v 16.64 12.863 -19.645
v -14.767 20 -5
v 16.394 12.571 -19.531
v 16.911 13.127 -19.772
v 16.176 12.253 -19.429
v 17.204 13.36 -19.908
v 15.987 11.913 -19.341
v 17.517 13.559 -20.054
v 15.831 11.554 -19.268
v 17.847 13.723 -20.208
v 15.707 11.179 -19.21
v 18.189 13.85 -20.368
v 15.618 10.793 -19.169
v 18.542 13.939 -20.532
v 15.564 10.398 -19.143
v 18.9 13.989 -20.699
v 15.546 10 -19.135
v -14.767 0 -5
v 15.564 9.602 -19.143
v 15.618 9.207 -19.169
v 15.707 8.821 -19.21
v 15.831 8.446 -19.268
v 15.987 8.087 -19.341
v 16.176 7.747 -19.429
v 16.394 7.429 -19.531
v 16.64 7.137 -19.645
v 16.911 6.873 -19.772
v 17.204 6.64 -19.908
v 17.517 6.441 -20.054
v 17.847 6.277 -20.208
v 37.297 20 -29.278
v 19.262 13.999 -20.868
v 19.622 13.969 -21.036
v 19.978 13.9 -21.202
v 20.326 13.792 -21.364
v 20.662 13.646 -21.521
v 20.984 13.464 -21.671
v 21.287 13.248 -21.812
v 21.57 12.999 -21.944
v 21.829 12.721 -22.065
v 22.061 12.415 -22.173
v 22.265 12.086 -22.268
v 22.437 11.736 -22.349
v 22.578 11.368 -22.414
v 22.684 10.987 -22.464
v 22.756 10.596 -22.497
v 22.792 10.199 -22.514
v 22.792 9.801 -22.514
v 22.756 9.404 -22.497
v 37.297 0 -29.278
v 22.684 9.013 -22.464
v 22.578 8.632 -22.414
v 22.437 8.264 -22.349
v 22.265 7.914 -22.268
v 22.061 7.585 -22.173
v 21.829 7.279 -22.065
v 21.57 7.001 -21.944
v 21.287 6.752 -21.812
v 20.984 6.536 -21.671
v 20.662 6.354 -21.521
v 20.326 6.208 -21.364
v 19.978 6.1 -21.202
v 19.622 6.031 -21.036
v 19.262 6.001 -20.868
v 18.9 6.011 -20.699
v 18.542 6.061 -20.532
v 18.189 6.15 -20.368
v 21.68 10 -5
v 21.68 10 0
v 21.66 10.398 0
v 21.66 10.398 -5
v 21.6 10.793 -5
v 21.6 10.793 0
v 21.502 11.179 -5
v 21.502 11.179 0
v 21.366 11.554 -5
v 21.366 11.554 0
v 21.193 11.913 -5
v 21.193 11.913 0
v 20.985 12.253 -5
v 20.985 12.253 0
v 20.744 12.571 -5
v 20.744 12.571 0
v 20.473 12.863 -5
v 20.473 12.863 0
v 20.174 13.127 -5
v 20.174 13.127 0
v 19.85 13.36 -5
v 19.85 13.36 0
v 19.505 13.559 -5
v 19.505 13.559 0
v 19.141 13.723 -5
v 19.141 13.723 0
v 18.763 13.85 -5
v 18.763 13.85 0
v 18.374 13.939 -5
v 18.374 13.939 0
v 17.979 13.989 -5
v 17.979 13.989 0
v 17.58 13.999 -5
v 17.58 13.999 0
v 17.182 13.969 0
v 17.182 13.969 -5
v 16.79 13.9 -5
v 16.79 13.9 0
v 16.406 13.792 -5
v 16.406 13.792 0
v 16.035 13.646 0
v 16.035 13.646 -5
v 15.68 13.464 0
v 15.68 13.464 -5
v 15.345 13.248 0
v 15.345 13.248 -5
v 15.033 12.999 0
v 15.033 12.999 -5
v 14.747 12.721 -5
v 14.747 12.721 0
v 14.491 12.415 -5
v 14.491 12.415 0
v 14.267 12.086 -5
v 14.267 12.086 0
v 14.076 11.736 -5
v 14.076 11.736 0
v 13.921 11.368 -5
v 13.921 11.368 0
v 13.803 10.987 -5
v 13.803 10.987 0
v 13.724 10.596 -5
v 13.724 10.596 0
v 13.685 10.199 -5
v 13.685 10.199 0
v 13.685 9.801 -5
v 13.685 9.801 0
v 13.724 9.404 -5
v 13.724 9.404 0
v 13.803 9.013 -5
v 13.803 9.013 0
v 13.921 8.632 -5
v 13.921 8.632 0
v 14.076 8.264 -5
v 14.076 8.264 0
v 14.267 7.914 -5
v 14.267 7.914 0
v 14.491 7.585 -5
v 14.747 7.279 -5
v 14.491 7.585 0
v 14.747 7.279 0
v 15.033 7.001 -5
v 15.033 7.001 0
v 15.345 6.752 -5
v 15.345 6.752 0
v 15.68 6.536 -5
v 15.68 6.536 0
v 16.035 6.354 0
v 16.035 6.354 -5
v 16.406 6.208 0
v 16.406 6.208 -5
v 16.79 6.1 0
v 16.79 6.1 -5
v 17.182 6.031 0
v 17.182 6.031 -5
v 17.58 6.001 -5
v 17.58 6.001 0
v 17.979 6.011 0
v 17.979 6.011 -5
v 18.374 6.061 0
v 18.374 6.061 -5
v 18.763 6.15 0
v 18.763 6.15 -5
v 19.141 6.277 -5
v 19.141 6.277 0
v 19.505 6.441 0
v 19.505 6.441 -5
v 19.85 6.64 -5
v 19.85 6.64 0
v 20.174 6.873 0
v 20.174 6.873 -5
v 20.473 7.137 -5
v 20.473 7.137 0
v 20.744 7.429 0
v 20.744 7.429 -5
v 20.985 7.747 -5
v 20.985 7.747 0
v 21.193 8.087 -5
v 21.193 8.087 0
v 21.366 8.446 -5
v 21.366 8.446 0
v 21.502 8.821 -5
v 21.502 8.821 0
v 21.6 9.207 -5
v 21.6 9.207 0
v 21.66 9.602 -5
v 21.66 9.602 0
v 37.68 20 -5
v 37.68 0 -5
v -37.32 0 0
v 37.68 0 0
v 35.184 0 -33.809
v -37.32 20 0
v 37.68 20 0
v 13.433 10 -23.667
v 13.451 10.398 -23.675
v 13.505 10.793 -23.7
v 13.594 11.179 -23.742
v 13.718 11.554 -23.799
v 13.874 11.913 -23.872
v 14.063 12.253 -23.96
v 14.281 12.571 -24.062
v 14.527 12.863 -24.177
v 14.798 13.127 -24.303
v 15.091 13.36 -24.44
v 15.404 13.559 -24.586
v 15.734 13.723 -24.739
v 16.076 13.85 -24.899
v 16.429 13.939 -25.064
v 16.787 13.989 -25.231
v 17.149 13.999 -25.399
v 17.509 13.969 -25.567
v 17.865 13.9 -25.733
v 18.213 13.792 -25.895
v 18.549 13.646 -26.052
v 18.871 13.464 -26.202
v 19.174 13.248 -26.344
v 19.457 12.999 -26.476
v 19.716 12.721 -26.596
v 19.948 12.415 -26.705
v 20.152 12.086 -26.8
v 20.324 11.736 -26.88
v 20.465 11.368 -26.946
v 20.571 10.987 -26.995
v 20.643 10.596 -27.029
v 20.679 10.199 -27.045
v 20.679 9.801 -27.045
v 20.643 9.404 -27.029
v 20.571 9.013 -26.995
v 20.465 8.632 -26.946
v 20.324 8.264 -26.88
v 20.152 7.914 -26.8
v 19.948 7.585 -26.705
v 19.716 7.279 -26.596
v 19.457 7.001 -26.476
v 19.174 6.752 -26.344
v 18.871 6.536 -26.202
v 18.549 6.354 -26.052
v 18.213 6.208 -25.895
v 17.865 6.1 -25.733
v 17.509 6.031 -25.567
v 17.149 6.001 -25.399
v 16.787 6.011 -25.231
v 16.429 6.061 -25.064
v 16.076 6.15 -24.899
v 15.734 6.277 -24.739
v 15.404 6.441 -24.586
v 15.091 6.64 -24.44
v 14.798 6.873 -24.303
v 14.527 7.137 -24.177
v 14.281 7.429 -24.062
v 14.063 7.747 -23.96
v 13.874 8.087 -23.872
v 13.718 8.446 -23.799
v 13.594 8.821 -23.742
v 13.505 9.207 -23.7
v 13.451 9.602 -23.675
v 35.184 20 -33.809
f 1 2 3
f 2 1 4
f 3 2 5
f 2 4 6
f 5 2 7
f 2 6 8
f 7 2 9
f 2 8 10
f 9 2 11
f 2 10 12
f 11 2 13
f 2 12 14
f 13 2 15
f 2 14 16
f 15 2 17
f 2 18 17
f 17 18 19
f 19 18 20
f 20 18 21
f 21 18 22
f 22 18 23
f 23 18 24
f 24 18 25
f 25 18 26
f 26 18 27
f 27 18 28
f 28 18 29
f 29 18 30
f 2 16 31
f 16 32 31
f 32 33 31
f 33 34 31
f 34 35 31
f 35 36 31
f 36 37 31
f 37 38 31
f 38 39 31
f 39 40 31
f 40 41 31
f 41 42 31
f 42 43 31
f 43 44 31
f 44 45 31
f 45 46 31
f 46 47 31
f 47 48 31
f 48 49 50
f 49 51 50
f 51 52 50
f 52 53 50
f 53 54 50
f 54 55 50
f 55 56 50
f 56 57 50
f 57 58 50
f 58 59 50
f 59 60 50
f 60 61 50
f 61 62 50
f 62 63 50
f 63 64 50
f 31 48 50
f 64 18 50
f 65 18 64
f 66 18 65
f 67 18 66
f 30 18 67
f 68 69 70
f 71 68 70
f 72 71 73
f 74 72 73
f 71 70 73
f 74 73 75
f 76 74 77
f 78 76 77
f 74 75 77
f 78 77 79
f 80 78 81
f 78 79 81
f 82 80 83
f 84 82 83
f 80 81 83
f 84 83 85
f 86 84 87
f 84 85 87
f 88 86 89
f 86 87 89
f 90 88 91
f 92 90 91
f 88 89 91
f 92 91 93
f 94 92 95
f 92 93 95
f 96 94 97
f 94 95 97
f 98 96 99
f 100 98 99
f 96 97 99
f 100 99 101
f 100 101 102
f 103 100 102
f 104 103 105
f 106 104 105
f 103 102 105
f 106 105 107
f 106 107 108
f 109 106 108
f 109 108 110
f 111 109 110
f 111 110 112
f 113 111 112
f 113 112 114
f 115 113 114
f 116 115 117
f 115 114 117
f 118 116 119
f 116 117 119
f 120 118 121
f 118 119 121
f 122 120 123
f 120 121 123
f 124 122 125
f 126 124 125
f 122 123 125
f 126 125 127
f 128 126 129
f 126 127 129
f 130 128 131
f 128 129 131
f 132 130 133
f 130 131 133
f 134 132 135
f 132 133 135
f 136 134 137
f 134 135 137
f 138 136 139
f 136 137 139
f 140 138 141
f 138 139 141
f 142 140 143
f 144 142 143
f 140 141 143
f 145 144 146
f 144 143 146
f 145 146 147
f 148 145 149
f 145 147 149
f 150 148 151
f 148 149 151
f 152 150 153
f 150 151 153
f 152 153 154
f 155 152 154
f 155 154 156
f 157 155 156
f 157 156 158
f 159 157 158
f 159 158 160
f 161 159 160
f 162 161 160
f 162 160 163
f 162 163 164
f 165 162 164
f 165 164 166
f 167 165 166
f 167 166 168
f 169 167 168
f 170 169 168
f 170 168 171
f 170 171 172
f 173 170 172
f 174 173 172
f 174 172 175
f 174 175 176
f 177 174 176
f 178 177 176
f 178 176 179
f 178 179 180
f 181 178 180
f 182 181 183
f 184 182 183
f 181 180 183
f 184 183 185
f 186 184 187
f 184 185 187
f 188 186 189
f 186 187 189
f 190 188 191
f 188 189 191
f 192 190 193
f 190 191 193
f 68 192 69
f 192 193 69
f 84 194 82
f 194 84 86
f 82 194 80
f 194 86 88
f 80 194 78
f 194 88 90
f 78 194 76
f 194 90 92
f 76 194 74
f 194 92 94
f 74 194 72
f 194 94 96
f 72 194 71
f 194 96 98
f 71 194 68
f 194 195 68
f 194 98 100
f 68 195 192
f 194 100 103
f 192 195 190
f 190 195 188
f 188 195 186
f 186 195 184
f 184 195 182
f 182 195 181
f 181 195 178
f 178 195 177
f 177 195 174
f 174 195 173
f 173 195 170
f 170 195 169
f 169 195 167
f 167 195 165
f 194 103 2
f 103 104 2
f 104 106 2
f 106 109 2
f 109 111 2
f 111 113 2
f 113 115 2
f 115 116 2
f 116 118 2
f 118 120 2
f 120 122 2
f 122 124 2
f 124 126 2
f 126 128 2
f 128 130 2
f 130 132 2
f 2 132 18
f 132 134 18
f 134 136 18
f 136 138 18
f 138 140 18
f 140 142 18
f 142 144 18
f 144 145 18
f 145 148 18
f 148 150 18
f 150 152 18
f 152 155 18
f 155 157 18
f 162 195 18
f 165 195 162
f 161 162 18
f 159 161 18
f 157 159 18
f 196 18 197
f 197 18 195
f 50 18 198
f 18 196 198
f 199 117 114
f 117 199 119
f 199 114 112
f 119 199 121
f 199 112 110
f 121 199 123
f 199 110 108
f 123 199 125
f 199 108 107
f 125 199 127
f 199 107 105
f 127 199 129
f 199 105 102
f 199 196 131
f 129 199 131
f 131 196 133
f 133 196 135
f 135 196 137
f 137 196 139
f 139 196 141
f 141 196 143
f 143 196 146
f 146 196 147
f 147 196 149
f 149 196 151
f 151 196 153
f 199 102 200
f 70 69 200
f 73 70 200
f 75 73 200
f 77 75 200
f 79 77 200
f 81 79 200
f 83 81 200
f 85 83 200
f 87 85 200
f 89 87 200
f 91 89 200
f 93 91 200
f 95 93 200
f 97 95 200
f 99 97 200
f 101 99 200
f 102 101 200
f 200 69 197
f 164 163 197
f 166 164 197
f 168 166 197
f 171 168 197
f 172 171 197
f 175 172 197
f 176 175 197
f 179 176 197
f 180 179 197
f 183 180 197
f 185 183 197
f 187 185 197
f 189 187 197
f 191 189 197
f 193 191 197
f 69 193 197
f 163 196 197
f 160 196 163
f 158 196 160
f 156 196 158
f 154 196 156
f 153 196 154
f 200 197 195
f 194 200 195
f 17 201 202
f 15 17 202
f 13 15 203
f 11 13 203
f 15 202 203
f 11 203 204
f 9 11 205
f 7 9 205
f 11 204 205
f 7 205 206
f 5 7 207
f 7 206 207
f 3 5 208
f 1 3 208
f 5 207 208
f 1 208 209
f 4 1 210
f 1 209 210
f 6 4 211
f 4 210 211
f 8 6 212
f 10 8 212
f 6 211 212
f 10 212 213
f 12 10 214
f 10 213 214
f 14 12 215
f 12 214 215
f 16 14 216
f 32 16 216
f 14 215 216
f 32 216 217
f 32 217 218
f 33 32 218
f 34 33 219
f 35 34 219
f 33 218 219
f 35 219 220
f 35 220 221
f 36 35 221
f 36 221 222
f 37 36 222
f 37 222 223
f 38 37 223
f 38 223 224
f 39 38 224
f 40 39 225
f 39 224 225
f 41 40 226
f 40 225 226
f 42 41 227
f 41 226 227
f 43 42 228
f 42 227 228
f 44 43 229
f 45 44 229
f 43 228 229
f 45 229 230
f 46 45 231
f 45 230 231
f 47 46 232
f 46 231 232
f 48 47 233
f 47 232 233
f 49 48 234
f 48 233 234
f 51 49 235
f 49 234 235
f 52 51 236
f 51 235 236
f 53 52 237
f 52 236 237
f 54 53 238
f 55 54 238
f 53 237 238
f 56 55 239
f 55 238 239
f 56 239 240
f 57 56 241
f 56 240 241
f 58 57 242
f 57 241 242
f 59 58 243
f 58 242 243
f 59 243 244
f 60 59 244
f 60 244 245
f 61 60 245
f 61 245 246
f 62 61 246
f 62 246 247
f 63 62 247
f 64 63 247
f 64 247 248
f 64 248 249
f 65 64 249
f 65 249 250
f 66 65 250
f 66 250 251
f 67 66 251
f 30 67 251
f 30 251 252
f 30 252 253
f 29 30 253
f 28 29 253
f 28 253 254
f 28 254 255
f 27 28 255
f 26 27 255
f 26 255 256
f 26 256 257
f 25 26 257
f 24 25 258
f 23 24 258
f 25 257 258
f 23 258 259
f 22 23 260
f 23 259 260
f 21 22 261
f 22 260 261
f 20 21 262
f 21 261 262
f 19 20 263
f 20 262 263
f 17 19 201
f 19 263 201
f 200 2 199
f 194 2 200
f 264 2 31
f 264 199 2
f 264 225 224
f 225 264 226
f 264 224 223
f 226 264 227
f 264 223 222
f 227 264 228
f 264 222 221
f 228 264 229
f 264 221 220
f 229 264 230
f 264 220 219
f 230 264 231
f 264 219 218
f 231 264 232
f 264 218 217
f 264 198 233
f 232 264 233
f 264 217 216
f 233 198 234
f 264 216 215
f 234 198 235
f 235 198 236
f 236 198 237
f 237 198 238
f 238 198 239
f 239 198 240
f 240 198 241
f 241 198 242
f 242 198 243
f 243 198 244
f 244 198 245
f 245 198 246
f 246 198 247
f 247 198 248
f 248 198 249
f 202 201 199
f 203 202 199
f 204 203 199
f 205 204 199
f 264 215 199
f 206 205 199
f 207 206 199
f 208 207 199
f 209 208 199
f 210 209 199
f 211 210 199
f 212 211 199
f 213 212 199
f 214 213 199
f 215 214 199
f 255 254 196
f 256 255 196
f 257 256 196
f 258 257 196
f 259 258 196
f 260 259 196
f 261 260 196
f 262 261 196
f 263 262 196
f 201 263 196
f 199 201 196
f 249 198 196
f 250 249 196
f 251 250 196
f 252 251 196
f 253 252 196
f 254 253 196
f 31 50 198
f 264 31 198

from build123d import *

# Parameters (mm, degrees)
BOSS_EXTRUDE1_DEPTH = 20
SKETCH2_R           = 4
CUT_EXTRUDE2_DEPTH  = 5
SKETCH3_R           = 4
CUT_EXTRUDE3_DEPTH  = 5


with BuildPart() as part:
    # Sketch1 → Boss-Extrude1 (new body)
    with BuildSketch(Plane(origin=(0, 0, 0), x_dir=(1, 0, 0), z_dir=(0, 1, 0))):
        Polygon((0, 0), (37.679677005, 0), (37.679677005, 5), (-14.766780477, 5), (37.297391276, 29.277922004), (35.184299968, 33.809460939), (-37.320322995, 0), align=None)
    extrude(amount=BOSS_EXTRUDE1_DEPTH)

    # Sketch2 → Cut-Extrude2 (cut)
    with BuildSketch(Plane(origin=(-6.665640892, 0, -14.294513023), x_dir=(-0.9063077870366526, 0, 0.42261826174069417), z_dir=(-0.42261826174069417, 0, -0.9063077870366526))):
        with Locations((-26.176300655, 10)):
            Circle(SKETCH2_R)
    extrude(amount=-CUT_EXTRUDE2_DEPTH, mode=Mode.SUBTRACT)

    # Sketch3 → Cut-Extrude3 (cut)
    with BuildSketch(Plane.XY):
        with Locations((17.679677005, 10)):
            Circle(SKETCH3_R)
    extrude(amount=-CUT_EXTRUDE3_DEPTH, mode=Mode.SUBTRACT)


solid = part.part
